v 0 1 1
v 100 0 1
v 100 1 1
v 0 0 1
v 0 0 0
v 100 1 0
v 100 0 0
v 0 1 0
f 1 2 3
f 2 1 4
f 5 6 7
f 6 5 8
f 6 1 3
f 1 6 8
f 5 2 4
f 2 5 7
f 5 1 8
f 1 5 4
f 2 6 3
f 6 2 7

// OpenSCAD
// a window stopper with rotating wedge
// (all sizes in millimeter)

module window_stopper(
    window_thickness,         // thickness of window frame
    windowsill_dist,          // distance between window and windowsill
    windowsill_adj     = 0,   // adjustment for windowsill distance
    stopper_width      = 30,  // width of the stopper
    material_thickness = 5,   // material thickness of the stopper
    window_overlap     = 7,   // overlap of stopper and window
    axle_dm            = 10,  // axle diameter
    axle_clearance     = 0.5, // axle clearance towards bushing
){

    $fn = 36;
    axle_height = 
        material_thickness + (windowsill_dist - material_thickness) / 2;

    module window() {
        color("LightSkyBlue")
        translate( [-20, -window_thickness / 2, windowsill_dist] )
        cube( [100, window_thickness, 0.1] );
    }

    module stopper_case() {
        case_size = [
            stopper_width,                              
            window_thickness + 2 * material_thickness,  
            windowsill_dist + window_overlap    
        ];
        
        translate( [0, -case_size.y / 2, 0] ) 
        difference() {
            cube( case_size );
            
            translate( [-1, material_thickness, material_thickness] )
            cube( [case_size.x + 2, window_thickness, case_size.z] );
            
            axle_bushing = axle_dm + axle_clearance;
            
            translate( [case_size.x / 2, -1, axle_height] )
            rotate( [-90, 0, 0] )
            cylinder( d = axle_bushing, h = case_size.y + 2);
            
            translate( [(case_size.x - axle_bushing) / 2, -1, axle_height] )
            cube( [axle_bushing, case_size.y + 2, case_size.z] );
        }
        
        translate( [0, -case_size.y / 2, -windowsill_adj] )
        cube( [case_size.x, case_size.y, windowsill_adj] );
    }

    module stopper() {
    }
    
    window();    
    stopper_case();    
    stopper();

}

window_stopper(

	/* parameters */

);
